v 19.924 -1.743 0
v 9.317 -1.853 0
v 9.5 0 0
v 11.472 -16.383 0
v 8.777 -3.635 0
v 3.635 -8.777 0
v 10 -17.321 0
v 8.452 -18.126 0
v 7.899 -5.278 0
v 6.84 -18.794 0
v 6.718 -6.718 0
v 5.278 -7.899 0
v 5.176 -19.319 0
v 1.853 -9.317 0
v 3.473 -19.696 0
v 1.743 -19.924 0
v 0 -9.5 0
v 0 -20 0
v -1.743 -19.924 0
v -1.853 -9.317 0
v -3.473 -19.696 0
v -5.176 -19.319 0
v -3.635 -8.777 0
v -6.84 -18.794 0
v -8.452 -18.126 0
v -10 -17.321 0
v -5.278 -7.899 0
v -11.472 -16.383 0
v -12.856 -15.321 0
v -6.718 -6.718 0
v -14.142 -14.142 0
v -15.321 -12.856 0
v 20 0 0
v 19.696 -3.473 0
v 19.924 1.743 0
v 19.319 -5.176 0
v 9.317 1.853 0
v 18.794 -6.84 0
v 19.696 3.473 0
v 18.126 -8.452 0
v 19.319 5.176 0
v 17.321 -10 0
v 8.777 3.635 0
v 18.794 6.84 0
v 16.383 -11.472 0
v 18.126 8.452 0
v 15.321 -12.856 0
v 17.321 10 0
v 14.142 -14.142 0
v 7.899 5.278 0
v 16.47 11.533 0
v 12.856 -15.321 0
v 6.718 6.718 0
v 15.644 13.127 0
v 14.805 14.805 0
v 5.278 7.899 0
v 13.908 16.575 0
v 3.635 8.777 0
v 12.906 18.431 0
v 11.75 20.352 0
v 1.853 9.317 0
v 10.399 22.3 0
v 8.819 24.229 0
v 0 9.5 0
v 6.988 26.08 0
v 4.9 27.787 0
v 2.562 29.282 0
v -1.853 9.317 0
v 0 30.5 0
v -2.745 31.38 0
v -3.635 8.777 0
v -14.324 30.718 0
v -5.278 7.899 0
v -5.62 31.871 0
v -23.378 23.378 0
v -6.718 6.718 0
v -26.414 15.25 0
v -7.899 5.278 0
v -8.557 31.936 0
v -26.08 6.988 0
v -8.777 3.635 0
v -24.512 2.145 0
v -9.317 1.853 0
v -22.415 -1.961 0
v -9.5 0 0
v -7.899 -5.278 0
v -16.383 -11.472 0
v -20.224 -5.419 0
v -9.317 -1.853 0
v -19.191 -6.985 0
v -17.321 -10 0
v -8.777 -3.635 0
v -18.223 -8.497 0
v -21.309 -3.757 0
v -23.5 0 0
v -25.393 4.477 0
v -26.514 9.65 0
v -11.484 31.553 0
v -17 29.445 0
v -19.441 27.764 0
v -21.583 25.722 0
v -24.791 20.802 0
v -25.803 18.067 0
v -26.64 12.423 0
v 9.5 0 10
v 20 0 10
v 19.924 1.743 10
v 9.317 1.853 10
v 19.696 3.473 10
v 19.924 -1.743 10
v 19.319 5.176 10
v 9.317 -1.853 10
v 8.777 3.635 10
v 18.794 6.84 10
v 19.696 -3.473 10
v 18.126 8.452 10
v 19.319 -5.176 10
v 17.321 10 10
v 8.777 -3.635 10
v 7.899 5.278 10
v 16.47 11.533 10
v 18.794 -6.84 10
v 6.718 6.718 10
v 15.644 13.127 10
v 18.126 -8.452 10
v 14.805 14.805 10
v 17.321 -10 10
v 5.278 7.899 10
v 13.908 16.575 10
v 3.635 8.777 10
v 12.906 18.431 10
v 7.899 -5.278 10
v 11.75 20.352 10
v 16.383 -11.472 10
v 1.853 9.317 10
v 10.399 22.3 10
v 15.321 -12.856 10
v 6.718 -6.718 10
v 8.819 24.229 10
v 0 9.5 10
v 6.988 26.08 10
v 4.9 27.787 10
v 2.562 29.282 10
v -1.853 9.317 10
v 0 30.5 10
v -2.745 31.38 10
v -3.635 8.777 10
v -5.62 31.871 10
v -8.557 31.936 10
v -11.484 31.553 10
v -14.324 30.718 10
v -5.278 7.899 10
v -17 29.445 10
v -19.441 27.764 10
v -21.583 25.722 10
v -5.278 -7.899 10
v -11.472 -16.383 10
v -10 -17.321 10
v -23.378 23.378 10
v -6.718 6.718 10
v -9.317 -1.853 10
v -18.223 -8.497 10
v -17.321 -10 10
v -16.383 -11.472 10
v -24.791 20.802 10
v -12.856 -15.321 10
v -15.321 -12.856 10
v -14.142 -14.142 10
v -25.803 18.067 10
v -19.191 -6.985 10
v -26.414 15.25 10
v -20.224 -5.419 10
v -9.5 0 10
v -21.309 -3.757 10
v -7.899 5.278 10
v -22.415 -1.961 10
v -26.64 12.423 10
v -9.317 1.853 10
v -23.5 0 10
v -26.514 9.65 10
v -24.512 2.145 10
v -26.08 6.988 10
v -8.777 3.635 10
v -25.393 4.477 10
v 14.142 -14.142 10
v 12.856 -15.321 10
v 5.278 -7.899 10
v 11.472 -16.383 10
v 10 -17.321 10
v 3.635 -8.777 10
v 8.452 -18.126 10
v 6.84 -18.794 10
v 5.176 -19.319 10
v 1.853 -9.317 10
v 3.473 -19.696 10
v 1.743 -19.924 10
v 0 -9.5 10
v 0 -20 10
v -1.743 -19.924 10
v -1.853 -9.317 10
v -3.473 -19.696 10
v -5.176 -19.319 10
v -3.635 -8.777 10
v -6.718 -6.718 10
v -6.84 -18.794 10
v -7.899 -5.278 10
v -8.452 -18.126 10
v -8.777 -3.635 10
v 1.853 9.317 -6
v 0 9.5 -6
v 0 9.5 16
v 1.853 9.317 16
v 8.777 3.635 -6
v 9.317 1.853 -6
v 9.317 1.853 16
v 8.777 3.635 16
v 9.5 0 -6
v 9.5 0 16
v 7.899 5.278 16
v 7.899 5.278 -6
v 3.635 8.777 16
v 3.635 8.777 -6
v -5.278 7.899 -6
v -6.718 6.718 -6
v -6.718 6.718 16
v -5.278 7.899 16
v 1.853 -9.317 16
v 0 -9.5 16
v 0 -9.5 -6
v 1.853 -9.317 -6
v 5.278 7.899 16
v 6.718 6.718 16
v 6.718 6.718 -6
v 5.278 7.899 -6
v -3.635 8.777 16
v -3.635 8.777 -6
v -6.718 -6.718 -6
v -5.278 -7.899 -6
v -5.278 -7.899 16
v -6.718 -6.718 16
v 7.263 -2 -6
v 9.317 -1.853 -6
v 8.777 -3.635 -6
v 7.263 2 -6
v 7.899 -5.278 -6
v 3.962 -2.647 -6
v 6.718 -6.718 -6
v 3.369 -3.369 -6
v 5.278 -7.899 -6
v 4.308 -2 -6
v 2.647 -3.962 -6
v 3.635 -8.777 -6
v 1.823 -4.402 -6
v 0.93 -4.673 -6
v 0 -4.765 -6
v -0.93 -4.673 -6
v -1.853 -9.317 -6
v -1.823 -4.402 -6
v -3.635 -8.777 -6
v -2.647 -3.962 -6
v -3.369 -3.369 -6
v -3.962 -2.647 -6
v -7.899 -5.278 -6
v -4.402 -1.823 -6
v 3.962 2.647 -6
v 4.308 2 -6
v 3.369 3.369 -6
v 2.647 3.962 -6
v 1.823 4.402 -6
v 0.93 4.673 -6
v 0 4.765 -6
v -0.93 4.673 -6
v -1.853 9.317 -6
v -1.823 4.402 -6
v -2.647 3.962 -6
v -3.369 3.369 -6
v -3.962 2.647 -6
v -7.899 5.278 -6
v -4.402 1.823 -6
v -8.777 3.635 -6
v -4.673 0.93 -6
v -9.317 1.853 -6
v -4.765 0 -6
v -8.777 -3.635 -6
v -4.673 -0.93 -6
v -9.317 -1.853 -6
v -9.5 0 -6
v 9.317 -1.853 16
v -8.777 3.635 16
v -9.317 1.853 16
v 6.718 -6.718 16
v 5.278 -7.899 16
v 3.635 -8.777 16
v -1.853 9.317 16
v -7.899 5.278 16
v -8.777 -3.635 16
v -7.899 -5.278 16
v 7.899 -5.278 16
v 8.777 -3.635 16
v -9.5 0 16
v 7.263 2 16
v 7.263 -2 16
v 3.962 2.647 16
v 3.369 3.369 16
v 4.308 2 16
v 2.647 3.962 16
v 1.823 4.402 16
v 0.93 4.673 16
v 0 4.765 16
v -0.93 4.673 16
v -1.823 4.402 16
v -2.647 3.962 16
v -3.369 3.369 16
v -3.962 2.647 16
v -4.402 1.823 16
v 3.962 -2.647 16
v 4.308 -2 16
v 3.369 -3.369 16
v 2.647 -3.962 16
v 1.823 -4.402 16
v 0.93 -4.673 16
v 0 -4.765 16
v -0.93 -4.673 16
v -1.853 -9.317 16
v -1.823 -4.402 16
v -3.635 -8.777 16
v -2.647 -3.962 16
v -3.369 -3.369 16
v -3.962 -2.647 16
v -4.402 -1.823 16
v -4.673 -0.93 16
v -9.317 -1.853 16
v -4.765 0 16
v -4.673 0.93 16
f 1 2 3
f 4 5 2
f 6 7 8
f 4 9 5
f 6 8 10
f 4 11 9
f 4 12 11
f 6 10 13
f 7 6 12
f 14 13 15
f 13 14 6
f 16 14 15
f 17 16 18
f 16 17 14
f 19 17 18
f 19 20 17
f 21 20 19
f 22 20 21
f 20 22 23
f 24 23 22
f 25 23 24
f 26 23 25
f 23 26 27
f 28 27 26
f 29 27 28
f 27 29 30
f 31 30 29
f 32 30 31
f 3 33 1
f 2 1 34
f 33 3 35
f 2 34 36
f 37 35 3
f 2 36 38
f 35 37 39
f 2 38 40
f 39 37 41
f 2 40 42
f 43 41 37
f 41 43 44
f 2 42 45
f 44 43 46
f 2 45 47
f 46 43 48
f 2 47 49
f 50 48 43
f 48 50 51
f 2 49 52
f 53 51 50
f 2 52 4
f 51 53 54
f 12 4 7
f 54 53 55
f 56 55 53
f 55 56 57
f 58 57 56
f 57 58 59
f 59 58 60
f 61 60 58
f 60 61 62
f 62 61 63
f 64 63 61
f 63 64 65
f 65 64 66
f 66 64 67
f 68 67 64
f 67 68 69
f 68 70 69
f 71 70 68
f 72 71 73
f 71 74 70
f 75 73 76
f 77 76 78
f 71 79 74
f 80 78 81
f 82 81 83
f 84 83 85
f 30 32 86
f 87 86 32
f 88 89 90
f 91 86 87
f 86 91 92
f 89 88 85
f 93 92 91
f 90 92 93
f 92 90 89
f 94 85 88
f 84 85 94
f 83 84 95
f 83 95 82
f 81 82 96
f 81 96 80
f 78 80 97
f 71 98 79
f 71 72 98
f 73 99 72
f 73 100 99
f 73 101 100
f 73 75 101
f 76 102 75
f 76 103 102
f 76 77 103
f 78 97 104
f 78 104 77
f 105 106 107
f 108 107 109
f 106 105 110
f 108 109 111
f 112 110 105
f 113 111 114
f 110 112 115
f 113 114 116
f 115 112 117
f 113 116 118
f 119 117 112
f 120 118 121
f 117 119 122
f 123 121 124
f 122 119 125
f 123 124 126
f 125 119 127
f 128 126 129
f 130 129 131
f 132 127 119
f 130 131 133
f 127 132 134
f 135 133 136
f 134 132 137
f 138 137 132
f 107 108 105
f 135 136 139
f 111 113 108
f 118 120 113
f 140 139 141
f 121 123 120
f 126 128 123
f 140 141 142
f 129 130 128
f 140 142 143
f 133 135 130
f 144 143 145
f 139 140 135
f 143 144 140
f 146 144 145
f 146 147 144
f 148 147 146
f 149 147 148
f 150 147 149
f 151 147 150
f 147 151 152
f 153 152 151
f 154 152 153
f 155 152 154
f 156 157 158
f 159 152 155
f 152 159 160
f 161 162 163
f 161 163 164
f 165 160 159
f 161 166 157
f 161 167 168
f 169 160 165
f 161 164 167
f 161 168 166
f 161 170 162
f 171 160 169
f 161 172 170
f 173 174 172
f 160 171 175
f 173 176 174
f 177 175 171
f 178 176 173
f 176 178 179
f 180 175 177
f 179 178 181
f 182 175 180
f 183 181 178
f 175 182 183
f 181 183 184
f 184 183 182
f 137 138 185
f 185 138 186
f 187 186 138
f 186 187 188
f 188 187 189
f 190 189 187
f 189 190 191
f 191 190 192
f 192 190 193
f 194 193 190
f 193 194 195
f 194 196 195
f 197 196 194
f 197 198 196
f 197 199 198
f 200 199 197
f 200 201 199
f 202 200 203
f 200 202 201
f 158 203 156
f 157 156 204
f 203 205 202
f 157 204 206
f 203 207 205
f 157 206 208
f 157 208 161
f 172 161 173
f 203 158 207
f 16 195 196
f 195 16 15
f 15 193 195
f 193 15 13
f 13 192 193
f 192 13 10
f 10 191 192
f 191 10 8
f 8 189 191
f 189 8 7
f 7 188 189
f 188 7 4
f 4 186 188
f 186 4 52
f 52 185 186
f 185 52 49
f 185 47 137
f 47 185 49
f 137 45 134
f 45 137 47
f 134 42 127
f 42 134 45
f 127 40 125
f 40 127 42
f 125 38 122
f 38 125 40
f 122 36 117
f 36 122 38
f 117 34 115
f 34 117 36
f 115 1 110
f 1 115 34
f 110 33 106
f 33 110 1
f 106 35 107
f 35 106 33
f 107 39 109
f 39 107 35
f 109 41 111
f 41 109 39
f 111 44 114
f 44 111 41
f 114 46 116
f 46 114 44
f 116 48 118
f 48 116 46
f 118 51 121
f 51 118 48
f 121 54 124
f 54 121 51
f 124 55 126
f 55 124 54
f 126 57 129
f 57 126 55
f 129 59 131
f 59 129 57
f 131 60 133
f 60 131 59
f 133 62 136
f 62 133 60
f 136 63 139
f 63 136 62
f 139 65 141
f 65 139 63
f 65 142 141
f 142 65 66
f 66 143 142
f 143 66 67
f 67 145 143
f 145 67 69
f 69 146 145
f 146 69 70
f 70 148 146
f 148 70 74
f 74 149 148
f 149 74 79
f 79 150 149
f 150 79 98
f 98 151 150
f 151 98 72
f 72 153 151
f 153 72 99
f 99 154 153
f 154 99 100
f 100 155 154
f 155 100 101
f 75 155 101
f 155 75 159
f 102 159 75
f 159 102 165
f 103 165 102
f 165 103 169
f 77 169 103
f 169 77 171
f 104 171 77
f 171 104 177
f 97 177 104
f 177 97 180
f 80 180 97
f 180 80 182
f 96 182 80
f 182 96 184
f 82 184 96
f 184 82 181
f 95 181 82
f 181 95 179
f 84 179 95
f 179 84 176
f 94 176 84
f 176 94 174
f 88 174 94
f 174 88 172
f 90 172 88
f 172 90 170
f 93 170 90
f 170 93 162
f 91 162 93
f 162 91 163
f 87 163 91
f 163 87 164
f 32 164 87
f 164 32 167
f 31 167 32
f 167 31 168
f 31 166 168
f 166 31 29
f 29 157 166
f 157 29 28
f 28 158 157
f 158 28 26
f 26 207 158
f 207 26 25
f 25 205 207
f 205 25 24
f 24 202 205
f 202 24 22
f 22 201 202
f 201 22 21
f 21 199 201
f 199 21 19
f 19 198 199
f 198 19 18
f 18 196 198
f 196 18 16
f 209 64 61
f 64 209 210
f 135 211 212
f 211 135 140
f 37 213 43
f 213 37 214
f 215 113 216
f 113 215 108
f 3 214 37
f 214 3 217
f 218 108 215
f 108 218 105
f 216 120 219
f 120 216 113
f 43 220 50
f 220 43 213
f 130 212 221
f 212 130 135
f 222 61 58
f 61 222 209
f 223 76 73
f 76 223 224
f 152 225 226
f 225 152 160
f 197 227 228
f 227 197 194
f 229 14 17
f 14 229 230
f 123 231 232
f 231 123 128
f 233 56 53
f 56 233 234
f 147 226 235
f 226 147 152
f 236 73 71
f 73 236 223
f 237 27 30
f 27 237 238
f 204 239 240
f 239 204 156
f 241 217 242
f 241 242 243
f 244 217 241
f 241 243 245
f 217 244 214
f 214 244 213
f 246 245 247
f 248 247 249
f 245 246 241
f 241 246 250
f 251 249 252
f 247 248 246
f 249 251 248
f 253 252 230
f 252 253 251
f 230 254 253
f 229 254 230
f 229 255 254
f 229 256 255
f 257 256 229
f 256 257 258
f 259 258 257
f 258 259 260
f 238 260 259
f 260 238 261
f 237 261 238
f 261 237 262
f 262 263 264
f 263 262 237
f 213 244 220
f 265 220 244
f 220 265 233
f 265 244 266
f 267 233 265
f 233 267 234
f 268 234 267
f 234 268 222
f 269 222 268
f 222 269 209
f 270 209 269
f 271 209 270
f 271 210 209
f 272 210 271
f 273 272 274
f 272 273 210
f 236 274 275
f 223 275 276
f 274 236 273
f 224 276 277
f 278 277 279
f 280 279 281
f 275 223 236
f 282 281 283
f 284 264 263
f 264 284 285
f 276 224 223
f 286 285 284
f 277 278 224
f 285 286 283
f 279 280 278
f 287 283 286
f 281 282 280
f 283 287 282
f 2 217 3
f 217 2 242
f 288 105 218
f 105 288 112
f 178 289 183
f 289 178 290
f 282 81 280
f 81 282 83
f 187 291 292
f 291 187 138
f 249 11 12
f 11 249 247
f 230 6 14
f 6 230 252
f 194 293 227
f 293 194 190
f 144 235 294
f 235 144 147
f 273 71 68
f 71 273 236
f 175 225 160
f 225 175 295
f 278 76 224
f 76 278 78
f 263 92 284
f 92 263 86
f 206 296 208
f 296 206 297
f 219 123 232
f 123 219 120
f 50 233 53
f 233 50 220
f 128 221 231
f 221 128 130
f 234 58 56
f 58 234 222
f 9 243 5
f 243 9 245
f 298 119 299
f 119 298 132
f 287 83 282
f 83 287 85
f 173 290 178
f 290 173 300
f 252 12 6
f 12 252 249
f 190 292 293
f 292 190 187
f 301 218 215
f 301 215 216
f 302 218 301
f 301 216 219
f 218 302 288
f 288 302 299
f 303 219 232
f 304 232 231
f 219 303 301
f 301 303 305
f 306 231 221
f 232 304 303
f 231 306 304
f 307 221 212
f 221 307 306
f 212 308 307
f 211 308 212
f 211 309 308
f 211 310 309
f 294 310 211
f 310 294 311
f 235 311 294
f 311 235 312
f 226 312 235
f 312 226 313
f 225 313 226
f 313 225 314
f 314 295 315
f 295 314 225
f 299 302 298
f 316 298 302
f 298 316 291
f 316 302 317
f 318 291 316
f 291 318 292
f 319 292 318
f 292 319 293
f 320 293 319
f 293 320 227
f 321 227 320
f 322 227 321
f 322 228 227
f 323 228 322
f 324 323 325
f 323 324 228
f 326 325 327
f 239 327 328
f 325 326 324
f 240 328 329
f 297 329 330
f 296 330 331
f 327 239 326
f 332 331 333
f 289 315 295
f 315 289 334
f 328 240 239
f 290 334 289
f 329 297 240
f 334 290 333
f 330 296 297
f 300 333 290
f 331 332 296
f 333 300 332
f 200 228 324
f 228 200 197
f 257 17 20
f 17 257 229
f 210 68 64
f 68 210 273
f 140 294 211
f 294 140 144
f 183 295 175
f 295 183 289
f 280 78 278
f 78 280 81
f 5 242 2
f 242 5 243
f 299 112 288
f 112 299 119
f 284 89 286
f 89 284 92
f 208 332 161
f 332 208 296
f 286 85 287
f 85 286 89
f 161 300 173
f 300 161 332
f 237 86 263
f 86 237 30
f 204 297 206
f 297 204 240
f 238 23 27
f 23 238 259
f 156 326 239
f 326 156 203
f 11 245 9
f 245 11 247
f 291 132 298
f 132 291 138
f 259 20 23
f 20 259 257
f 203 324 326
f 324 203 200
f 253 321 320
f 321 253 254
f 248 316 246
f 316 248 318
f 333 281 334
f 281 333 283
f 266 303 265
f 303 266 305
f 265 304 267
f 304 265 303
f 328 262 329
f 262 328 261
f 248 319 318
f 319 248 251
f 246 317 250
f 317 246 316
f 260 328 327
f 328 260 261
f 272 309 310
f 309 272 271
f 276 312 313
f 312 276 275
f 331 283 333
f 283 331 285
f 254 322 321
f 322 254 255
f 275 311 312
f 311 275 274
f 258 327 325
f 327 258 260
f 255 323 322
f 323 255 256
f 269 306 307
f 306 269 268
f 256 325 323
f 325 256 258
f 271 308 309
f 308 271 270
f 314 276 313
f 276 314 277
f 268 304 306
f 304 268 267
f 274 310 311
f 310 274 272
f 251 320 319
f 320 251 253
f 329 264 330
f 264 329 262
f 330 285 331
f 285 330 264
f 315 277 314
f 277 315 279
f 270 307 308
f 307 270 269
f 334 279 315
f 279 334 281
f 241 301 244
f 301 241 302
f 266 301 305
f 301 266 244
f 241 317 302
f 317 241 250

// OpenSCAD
$fn = 32;

// ----------------------------------------------------------------------
// Cam: base radius 20 mm with a 14 mm lift over 180 degrees
// ----------------------------------------------------------------------

// --- parameters (mm) ---
base_r = 20;              // base radius
lift = 14;                // lift height above the base radius
lift_span = 180;          // angular width of the lift
lift_start = 30;          // angle where the lift starts
cam_t = 10;               // cam plate thickness
hub_d = 19;               // hub diameter
hub_h = 22;               // hub height
bore_d = 9.53;            // bore
key_w = 4;                // keyway width
key_depth = 2;            // keyway depth

cam_profile = [[20, 0], [19.924, 1.743], [19.696, 3.473], [19.319, 5.176], [18.794, 6.84], [18.126, 8.452], [17.321, 10], [16.47, 11.533], [15.644, 13.127], [14.805, 14.805], [13.908, 16.575], [12.906, 18.431], [11.75, 20.352], [10.399, 22.3], [8.819, 24.229], [6.988, 26.08], [4.9, 27.787], [2.562, 29.282], [0, 30.5], [-2.745, 31.38], [-5.62, 31.871], [-8.557, 31.936], [-11.484, 31.553], [-14.324, 30.718], [-17, 29.445], [-19.441, 27.764], [-21.583, 25.722], [-23.378, 23.378], [-24.791, 20.802], [-25.803, 18.067], [-26.414, 15.25], [-26.64, 12.423], [-26.514, 9.65], [-26.08, 6.988], [-25.393, 4.477], [-24.512, 2.145], [-23.5, 0], [-22.415, -1.961], [-21.309, -3.757], [-20.224, -5.419], [-19.191, -6.985], [-18.223, -8.497], [-17.321, -10], [-16.383, -11.472], [-15.321, -12.856], [-14.142, -14.142], [-12.856, -15.321], [-11.472, -16.383], [-10, -17.321], [-8.452, -18.126], [-6.84, -18.794], [-5.176, -19.319], [-3.473, -19.696], [-1.743, -19.924], [0, -20], [1.743, -19.924], [3.473, -19.696], [5.176, -19.319], [6.84, -18.794], [8.452, -18.126], [10, -17.321], [11.472, -16.383], [12.856, -15.321], [14.142, -14.142], [15.321, -12.856], [16.383, -11.472], [17.321, -10], [18.126, -8.452], [18.794, -6.84], [19.319, -5.176], [19.696, -3.473], [19.924, -1.743]];

difference() {
  union() {
    linear_extrude(height = cam_t) polygon(cam_profile);
    /* hub, proud of the cam plate on both sides */
    translate([0, 0, -6]) cylinder(h = hub_h, d = hub_d);
  }
  /* bore through the hub, 2.5 mm clear on both faces */
  translate([0, 0, -8.5]) cylinder(h = hub_h + 5, d = bore_d);
  /* keyway, milled through the whole hub */
  translate([2.763, -2, -8.5]) cube([4.5, 4, 27]);
}
